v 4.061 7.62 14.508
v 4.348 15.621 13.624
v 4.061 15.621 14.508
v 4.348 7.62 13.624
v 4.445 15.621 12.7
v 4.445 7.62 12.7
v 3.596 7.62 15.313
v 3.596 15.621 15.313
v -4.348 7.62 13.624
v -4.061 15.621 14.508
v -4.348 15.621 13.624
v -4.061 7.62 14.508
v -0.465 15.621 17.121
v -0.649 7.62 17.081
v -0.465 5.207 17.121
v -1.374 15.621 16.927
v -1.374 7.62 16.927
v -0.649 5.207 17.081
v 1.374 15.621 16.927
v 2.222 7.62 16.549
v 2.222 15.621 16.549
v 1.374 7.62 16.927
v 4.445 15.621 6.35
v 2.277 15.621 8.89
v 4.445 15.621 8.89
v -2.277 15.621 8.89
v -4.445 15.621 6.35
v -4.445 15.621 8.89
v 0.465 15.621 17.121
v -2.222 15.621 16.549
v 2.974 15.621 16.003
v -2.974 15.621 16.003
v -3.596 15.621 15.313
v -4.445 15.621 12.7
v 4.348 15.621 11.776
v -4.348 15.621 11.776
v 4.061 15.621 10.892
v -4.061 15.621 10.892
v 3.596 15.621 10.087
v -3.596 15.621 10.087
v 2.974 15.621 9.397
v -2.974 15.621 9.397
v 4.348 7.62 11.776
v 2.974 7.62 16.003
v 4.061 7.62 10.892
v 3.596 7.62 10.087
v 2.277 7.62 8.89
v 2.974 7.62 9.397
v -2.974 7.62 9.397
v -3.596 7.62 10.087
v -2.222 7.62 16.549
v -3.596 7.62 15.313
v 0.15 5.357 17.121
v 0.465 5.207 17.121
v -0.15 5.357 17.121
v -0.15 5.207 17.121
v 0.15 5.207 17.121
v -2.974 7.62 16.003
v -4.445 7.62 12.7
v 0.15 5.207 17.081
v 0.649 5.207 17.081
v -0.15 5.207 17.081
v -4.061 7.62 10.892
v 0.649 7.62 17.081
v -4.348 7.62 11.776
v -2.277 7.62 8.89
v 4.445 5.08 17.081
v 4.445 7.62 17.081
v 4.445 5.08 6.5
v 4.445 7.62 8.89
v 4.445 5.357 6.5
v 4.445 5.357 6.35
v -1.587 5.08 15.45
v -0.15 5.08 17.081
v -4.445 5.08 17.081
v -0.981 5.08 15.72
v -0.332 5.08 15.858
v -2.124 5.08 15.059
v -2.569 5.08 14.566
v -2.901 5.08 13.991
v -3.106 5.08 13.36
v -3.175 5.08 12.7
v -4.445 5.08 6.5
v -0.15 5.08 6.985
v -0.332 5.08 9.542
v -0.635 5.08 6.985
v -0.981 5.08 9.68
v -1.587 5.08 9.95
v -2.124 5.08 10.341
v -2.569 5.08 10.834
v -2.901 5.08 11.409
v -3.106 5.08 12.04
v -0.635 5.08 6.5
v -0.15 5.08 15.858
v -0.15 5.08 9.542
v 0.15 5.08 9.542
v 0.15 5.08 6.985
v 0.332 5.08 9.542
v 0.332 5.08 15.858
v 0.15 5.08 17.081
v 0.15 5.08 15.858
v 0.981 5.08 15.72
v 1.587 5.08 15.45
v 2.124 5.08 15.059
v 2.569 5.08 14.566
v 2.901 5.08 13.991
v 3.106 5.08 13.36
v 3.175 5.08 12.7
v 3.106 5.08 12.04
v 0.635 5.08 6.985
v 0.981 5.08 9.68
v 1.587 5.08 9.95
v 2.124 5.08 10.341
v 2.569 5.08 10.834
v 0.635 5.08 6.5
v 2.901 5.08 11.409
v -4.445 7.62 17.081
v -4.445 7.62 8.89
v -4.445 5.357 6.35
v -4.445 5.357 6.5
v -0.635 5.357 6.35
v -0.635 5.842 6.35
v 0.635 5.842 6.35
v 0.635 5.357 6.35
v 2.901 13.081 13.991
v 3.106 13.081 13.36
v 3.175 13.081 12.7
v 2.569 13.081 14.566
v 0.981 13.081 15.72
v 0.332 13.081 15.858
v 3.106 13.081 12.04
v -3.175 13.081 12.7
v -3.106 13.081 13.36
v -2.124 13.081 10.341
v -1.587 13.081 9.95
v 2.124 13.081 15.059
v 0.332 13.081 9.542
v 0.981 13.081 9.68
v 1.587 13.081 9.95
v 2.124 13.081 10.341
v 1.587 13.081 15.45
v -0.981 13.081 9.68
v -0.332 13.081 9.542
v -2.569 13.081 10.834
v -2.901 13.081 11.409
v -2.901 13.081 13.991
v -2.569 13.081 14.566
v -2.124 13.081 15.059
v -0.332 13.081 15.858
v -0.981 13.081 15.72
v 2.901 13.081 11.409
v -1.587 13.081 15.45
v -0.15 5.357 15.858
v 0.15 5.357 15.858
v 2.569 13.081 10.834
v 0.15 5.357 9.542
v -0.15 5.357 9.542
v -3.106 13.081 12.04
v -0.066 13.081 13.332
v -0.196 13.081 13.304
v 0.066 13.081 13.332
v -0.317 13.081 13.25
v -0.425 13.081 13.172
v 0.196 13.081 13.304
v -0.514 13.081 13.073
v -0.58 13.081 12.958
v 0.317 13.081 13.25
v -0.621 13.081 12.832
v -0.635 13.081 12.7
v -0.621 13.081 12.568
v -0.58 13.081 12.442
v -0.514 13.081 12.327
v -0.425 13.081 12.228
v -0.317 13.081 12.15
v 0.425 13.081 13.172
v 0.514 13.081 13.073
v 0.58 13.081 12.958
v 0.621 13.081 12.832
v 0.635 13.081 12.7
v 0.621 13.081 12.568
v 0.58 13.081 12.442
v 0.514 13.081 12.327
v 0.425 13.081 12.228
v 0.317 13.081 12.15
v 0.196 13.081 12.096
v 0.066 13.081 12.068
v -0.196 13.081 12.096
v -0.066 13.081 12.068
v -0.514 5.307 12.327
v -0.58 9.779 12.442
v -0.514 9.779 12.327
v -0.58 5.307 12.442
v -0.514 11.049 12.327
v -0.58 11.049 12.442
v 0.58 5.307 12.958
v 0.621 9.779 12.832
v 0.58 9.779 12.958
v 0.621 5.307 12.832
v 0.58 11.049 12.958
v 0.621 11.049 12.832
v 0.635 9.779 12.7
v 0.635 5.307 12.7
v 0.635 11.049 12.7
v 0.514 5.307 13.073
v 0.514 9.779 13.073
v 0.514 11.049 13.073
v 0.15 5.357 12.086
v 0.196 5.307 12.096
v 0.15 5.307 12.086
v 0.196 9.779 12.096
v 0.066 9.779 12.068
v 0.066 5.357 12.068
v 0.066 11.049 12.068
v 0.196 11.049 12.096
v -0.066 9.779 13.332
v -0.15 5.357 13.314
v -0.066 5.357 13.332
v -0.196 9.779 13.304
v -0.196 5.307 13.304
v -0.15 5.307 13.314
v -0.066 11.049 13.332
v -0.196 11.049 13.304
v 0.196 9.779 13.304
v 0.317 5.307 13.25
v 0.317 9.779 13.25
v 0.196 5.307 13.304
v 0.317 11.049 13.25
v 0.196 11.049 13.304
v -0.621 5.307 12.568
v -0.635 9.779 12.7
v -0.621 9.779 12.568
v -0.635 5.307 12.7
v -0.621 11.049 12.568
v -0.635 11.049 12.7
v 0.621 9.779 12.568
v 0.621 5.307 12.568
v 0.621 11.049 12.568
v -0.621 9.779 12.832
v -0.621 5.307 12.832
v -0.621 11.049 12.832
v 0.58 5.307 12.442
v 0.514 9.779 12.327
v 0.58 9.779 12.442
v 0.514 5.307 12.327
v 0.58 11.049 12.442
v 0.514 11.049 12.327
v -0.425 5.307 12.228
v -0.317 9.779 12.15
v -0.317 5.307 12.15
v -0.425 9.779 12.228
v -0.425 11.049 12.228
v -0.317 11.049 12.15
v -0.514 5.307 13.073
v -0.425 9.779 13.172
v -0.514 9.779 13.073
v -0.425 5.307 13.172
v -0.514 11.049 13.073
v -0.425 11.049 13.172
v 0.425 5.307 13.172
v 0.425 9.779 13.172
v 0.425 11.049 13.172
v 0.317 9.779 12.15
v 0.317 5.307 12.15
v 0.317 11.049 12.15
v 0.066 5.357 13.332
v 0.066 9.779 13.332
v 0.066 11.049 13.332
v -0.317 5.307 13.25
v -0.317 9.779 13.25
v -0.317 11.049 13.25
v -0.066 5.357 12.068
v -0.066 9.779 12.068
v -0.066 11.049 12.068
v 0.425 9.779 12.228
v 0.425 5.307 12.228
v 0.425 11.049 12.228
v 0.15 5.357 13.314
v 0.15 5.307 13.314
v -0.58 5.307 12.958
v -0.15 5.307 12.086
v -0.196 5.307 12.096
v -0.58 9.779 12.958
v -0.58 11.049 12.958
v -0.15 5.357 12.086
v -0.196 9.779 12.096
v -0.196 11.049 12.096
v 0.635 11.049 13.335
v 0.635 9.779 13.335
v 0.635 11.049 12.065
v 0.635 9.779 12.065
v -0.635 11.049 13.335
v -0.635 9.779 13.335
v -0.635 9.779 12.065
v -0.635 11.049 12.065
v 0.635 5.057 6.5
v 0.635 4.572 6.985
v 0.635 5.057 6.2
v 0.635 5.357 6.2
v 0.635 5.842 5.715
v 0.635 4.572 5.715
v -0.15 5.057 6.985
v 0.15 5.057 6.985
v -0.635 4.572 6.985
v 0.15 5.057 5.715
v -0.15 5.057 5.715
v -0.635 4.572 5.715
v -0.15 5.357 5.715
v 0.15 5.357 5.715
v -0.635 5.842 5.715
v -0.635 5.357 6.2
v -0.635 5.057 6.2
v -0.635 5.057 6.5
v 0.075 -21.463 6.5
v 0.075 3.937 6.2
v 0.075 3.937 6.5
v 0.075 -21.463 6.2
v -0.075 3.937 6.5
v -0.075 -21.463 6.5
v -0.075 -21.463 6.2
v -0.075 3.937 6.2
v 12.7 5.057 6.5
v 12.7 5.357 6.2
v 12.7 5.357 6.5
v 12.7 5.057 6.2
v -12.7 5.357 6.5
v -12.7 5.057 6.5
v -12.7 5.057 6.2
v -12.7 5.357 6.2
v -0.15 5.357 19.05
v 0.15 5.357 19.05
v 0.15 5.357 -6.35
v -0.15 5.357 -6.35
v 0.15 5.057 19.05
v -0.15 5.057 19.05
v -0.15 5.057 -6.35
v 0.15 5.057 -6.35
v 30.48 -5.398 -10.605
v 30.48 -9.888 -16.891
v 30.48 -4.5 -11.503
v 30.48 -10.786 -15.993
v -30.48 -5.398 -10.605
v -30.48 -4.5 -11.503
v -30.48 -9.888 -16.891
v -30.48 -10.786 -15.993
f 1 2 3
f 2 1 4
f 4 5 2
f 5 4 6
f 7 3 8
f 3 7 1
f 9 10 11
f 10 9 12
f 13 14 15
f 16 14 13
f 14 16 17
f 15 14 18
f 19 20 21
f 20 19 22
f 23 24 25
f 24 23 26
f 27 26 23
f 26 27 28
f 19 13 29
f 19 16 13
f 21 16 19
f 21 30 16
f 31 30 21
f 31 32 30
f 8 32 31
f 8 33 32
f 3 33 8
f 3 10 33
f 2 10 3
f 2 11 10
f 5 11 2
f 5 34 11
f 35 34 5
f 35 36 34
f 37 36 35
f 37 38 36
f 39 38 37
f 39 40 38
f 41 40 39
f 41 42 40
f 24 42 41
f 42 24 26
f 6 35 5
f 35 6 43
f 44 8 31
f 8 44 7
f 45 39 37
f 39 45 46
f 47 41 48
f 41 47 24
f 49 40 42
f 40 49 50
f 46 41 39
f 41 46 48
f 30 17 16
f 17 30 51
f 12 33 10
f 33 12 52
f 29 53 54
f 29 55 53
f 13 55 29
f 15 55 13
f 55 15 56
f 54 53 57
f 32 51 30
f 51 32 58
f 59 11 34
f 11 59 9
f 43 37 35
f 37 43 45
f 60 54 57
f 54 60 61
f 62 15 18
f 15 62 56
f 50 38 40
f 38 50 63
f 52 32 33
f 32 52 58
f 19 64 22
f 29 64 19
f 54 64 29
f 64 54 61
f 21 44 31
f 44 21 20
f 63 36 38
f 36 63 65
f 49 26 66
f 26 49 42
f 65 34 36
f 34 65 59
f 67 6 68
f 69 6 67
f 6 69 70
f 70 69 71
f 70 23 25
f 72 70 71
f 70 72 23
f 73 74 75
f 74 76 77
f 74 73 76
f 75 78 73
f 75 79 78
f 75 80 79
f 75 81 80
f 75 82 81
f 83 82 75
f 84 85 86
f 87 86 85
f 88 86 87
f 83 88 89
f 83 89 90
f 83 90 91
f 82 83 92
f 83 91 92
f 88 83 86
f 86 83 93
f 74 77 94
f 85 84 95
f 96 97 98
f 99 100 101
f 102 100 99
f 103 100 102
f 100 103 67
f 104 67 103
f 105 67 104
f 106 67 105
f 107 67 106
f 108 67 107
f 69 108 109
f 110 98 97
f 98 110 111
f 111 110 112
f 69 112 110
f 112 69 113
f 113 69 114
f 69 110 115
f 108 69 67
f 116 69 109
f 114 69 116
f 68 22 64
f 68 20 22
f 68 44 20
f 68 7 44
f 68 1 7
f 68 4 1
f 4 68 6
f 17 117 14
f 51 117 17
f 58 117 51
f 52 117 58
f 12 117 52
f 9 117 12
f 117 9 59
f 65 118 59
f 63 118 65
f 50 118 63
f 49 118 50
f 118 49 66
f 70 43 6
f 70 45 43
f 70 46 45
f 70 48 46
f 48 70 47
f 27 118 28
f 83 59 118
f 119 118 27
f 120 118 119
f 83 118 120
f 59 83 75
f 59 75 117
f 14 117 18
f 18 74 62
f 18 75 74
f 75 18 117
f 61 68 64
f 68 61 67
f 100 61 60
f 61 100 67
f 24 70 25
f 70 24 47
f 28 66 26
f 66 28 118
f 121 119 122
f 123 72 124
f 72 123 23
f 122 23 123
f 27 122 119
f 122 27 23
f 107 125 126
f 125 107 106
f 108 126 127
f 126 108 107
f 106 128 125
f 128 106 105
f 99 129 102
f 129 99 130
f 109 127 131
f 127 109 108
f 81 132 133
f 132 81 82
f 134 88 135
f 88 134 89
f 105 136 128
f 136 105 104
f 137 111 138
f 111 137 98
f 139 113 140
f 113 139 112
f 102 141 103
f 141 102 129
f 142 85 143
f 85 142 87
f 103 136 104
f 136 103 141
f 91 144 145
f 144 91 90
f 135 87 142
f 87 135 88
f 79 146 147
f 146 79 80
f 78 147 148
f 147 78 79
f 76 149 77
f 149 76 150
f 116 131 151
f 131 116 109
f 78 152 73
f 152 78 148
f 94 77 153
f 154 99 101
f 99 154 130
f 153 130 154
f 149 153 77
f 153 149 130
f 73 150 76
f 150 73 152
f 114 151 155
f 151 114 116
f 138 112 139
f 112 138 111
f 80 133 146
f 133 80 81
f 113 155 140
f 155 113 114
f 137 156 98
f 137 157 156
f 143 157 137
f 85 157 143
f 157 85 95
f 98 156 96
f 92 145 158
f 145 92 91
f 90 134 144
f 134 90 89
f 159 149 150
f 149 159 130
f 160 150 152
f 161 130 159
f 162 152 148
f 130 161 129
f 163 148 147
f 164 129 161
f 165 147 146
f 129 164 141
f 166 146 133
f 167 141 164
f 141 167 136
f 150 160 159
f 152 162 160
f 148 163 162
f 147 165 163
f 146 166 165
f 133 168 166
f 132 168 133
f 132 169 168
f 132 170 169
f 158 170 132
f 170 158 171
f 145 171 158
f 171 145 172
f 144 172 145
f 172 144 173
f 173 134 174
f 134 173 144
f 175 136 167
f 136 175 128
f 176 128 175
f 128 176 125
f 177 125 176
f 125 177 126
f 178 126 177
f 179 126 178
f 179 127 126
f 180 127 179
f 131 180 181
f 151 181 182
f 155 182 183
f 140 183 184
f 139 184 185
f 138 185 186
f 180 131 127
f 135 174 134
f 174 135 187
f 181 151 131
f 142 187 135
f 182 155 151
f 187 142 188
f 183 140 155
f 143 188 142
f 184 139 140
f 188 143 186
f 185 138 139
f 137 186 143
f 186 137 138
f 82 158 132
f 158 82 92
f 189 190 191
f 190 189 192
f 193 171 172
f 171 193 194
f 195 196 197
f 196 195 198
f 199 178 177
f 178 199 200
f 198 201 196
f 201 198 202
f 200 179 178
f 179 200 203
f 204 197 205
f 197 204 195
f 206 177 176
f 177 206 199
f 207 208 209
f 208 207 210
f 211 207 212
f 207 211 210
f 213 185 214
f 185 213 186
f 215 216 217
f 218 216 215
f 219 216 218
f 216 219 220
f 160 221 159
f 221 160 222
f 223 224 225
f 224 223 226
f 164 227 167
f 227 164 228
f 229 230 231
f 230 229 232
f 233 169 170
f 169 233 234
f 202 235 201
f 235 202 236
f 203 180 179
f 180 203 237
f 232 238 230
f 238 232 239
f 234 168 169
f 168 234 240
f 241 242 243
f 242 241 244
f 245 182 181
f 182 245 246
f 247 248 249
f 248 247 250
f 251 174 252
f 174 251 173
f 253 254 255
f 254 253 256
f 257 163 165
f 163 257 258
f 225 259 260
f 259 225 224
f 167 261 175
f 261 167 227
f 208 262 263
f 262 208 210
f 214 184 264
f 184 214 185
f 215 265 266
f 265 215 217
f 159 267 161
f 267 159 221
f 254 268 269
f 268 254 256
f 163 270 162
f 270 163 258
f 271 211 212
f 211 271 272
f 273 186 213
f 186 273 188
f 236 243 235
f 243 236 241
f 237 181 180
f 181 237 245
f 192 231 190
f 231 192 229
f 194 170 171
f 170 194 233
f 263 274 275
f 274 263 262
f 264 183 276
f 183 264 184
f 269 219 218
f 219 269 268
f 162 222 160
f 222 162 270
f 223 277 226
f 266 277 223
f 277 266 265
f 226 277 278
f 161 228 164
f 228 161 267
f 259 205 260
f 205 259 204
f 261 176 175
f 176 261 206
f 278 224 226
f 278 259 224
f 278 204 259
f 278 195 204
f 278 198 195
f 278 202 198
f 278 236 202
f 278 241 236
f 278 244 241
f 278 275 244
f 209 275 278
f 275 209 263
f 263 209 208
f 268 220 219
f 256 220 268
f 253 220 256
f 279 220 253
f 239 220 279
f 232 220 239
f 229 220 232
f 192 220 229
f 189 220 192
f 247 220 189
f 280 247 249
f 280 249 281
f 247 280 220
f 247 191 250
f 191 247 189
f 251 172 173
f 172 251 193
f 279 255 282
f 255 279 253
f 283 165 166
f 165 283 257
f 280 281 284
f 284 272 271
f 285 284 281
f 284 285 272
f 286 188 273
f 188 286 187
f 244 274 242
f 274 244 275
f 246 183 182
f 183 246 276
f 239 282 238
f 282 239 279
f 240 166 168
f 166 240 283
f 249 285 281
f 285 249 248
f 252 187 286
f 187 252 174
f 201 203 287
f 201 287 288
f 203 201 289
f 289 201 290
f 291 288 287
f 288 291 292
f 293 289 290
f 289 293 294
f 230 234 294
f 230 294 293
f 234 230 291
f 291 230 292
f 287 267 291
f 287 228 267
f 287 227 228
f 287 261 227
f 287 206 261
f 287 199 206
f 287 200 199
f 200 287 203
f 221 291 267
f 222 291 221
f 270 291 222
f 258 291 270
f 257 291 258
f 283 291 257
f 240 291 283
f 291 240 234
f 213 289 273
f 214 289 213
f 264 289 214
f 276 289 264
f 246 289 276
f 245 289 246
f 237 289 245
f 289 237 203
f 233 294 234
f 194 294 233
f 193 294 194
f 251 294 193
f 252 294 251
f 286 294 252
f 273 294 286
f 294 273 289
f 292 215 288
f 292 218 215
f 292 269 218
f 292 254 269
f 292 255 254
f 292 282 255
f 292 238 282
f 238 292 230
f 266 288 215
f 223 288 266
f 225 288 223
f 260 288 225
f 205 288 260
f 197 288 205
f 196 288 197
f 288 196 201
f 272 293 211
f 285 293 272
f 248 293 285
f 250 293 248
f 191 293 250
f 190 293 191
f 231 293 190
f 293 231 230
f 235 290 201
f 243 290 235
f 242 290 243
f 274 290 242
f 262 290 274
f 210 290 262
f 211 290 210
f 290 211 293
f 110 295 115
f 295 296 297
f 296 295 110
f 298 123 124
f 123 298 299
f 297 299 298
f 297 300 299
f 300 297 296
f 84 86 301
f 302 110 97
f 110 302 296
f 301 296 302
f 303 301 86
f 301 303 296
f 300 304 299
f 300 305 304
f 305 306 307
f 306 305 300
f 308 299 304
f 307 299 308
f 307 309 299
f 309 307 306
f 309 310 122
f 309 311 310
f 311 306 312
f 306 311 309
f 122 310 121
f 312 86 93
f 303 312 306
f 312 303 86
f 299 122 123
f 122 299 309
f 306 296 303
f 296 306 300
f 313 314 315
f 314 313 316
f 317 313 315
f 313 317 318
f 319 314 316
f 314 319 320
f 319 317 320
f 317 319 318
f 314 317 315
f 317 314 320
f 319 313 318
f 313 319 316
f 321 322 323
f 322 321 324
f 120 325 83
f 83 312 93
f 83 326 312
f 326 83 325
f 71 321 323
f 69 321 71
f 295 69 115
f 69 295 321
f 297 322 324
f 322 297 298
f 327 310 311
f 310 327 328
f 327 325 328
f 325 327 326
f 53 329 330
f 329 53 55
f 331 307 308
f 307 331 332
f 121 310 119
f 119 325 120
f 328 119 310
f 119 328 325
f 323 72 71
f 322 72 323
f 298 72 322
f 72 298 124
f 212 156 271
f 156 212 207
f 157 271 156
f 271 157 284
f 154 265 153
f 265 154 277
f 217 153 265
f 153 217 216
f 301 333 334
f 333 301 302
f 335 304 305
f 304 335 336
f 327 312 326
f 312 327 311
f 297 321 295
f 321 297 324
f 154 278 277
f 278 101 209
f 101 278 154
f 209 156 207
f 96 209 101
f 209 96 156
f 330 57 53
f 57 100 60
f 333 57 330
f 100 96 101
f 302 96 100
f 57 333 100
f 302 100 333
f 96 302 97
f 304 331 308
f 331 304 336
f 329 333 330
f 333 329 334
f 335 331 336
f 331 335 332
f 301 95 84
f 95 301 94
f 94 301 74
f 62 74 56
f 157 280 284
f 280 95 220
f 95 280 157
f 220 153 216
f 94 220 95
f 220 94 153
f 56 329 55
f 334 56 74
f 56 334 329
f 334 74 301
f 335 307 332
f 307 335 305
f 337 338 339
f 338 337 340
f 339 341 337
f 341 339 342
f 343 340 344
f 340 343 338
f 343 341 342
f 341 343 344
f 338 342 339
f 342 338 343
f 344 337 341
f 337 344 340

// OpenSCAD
include <../mo/mo.scad>

moDCCoaxSocket_Height = 0.41 * in;
moDCCoaxSocket_Width = 0.35 * in;
moDCCoaxSocket_Depth = 0.42 * in;
moDCCoaxSocket_ExternalBarrel = 0.35 * in;
moDCCoaxSocket_InternalBarrel = 0.25 * in;
moDCCoadSocket_CentralPin = 0.05 * in;
moDCCoaxSocket_BarrelHeight = 0.55 * in;
moDCCoaxSocket_BarrelDepth = 0.25 * in;
moDCCoaxSocket_FrontHeight = 0.1 * in;

positions = [ 
  [ [ 0, 0, 0 ], [ 0, 0, 1 ], 0 ],
  [ [ 0, -moDCCoaxSocket_Height/2, -moDCCoaxSocket_BarrelDepth ], [ 1, 0, 0 ], 0 ]
];

module moDCCoaxSocket( p = 0, info = false, name = false ) {
  moPresent( positions, p, info ) {
    // USB Connector
    rotate( [ 90, 0, 0 ] ) {
     color( Aluminum ) 
        cylinder( d = moDCCoadSocket_CentralPin, h = moDCCoaxSocket_Height - 2 * Epsilon, center = true );
        color( BlackABS ) {
      difference() {
        union() {
          cylinder( d = moDCCoaxSocket_ExternalBarrel, h = moDCCoaxSocket_Height, center = true );
          translate( [ 0, -0.0375*in,  (moDCCoaxSocket_Depth-moDCCoaxSocket_FrontHeight)/2 ] )
            cube( [ moDCCoaxSocket_Width, moDCCoaxSocket_Depth, moDCCoaxSocket_FrontHeight ], center = true );
          translate( [ 0, -moDCCoaxSocket_BarrelDepth/2 - 0.075*in, 0 ] )
            cube( [ moDCCoaxSocket_Width, moDCCoaxSocket_FrontHeight, moDCCoaxSocket_Height ], center = true );
        }
        translate( [ 0, 0, 0.1 * in ] )
          cylinder( d = moDCCoaxSocket_InternalBarrel, h = moDCCoaxSocket_Height, center = true );
      }
    }
  }
  }
}


function moDCCoaxSocketPosition( p = 0 ) = positions[ p ];

moMoveOriginTo(moDCCoaxSocketPosition( 1 ) ) {
  moDCCoaxSocket( 1, info = true, $name = true );
}
